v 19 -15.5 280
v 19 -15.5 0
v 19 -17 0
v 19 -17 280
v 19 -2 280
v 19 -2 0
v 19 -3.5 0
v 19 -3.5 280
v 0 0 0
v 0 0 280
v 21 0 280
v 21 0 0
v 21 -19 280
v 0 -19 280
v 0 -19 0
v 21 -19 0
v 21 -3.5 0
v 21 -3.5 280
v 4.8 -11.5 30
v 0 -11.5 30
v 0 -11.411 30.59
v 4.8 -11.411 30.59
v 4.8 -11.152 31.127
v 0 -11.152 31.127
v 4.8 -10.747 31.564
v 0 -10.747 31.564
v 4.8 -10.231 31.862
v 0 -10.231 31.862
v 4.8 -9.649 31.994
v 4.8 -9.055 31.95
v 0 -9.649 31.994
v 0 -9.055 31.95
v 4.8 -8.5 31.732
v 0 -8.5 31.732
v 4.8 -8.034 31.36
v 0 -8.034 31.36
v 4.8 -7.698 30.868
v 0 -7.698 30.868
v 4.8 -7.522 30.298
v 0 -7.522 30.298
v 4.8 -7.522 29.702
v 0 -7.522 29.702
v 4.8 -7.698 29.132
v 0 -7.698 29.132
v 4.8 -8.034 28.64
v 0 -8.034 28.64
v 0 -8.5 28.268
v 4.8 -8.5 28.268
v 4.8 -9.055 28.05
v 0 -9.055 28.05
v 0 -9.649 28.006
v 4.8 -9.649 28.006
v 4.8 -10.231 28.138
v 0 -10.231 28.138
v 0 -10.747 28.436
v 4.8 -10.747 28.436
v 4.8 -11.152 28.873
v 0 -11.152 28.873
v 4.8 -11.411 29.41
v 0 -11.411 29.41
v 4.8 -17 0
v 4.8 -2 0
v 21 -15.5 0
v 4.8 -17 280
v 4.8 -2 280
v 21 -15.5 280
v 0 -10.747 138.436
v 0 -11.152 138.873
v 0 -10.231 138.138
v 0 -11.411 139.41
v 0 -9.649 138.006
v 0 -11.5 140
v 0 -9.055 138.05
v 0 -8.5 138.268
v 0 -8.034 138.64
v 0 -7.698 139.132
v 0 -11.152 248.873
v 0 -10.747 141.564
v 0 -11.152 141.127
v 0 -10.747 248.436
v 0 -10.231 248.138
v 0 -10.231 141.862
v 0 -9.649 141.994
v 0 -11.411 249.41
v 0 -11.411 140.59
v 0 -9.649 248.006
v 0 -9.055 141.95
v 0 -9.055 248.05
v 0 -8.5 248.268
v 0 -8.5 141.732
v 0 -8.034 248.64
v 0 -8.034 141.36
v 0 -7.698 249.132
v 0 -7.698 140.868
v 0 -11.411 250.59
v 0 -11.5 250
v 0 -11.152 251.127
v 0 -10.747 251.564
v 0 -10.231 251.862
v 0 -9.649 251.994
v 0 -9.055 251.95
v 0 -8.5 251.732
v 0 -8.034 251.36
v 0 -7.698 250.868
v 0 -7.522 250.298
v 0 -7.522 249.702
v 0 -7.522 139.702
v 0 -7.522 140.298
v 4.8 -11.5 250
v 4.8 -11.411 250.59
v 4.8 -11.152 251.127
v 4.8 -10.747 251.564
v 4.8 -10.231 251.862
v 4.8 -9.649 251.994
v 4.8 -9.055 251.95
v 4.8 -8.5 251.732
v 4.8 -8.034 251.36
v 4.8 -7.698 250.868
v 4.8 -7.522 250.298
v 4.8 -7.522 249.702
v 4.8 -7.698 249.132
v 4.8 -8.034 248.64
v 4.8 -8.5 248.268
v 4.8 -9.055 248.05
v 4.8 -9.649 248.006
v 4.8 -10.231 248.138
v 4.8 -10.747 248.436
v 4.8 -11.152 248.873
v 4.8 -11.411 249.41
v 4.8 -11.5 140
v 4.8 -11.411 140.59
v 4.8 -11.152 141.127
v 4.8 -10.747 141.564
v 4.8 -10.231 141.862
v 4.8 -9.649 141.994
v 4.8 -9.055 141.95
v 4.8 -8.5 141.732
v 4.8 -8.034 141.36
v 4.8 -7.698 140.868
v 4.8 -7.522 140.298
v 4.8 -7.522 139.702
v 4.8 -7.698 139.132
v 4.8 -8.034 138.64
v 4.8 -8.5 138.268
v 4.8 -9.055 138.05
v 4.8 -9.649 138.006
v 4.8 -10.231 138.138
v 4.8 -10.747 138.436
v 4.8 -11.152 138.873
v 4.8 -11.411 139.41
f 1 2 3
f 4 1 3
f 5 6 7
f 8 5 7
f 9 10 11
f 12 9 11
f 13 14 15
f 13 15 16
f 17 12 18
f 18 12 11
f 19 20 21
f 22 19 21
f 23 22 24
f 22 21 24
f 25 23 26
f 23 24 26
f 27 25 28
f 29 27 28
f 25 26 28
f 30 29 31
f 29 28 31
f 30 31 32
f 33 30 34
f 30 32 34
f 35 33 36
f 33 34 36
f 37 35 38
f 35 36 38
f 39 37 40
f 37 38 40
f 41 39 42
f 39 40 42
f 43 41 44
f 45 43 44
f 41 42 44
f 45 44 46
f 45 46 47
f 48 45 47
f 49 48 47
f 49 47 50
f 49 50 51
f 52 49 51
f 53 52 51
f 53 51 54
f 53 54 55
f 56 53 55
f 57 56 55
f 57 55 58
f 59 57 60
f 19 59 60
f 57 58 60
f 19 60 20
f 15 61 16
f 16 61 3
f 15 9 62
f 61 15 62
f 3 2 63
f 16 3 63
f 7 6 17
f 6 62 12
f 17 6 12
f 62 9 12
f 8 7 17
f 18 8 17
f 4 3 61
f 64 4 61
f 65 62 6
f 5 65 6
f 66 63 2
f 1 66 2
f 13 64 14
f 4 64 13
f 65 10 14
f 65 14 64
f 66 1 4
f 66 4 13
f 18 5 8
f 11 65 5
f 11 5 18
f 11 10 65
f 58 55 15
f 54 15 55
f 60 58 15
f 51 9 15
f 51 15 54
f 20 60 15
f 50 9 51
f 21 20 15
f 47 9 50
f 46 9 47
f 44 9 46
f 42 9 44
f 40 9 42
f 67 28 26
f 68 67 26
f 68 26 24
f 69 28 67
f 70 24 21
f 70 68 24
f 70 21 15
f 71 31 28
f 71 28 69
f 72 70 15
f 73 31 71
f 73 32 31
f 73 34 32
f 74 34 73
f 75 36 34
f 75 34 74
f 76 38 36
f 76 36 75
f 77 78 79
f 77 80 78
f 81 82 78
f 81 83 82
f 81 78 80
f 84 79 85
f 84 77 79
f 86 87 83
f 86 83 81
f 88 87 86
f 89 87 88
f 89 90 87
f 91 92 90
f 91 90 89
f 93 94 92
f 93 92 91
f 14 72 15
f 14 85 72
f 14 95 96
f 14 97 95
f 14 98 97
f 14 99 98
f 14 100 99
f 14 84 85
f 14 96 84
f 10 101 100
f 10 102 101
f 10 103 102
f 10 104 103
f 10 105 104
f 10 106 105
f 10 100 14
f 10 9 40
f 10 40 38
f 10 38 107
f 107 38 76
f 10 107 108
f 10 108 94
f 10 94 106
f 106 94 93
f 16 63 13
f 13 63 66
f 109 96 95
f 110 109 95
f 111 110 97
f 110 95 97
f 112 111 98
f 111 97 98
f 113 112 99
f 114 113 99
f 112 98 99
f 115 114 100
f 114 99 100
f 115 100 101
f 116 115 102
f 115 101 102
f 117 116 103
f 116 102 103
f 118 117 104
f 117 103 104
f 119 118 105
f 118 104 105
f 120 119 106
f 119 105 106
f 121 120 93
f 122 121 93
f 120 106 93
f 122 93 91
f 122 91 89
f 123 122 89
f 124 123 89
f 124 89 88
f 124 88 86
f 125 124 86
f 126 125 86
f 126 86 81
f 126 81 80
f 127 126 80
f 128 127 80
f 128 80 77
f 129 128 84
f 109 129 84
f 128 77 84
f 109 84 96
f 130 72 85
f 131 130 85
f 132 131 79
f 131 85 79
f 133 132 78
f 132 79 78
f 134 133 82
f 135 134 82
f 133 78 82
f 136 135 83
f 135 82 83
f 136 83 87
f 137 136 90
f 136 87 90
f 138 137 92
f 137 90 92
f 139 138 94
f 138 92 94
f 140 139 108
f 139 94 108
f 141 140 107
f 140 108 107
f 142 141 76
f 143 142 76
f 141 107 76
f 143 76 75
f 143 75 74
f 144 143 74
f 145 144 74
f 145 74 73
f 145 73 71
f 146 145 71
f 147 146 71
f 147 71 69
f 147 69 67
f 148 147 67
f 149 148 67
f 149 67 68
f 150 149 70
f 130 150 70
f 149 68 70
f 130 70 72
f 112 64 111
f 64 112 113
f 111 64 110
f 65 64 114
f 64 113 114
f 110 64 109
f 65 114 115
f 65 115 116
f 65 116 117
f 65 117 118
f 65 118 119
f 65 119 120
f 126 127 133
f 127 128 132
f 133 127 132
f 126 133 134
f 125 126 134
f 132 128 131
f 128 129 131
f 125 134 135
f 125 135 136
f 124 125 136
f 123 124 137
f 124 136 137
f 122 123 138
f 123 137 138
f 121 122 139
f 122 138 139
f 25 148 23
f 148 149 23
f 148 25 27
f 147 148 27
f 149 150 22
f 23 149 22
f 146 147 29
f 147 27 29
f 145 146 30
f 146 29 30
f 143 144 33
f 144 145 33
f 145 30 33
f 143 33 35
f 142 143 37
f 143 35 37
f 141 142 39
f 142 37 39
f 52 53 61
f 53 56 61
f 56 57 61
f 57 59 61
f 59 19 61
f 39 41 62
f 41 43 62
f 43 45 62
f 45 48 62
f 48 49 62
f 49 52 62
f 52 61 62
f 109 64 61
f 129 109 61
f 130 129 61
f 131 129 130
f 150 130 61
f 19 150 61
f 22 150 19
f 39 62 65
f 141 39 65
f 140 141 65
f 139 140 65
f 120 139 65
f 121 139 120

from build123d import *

# Parameters (mm, degrees)
F0_W     = 21
F0_H     = 280
F1_DEPTH = 19
F3_DEPTH = 280.001
F4_R     = 2
F5_DEPTH = 4.8


with BuildPart() as f1:
    # F0 (on Front) → F1 (new body)
    with BuildSketch(Plane.XZ):
        with Locations((10.5, 140)):
            Rectangle(F0_W, F0_H)
    extrude(amount=F1_DEPTH)

    # F2 (on face) → F3 (cut, through all)
    with BuildSketch(Plane(origin=(0, 0, 0), x_dir=(1, 0, 0), z_dir=(0, 0, -1))):
        Polygon((19, 17), (4.8, 17), (4.8, 2), (19, 2), (19, 3.5), (21, 3.5), (21, 15.5), (19, 15.5), align=None)
    extrude(amount=-F3_DEPTH, mode=Mode.SUBTRACT)

    # F4 (on face) → F5 (cut, through all)
    with BuildSketch(Plane(origin=(0, 0, 0), x_dir=(0, -1, 0), z_dir=(-1, 0, 0))):
        with Locations((9.5, 30)):
            Circle(F4_R)
        with Locations((9.5, 140)):
            Circle(F4_R)
        with Locations((9.5, 250)):
            Circle(F4_R)
    extrude(amount=-F5_DEPTH, mode=Mode.SUBTRACT)


solid = f1.part
